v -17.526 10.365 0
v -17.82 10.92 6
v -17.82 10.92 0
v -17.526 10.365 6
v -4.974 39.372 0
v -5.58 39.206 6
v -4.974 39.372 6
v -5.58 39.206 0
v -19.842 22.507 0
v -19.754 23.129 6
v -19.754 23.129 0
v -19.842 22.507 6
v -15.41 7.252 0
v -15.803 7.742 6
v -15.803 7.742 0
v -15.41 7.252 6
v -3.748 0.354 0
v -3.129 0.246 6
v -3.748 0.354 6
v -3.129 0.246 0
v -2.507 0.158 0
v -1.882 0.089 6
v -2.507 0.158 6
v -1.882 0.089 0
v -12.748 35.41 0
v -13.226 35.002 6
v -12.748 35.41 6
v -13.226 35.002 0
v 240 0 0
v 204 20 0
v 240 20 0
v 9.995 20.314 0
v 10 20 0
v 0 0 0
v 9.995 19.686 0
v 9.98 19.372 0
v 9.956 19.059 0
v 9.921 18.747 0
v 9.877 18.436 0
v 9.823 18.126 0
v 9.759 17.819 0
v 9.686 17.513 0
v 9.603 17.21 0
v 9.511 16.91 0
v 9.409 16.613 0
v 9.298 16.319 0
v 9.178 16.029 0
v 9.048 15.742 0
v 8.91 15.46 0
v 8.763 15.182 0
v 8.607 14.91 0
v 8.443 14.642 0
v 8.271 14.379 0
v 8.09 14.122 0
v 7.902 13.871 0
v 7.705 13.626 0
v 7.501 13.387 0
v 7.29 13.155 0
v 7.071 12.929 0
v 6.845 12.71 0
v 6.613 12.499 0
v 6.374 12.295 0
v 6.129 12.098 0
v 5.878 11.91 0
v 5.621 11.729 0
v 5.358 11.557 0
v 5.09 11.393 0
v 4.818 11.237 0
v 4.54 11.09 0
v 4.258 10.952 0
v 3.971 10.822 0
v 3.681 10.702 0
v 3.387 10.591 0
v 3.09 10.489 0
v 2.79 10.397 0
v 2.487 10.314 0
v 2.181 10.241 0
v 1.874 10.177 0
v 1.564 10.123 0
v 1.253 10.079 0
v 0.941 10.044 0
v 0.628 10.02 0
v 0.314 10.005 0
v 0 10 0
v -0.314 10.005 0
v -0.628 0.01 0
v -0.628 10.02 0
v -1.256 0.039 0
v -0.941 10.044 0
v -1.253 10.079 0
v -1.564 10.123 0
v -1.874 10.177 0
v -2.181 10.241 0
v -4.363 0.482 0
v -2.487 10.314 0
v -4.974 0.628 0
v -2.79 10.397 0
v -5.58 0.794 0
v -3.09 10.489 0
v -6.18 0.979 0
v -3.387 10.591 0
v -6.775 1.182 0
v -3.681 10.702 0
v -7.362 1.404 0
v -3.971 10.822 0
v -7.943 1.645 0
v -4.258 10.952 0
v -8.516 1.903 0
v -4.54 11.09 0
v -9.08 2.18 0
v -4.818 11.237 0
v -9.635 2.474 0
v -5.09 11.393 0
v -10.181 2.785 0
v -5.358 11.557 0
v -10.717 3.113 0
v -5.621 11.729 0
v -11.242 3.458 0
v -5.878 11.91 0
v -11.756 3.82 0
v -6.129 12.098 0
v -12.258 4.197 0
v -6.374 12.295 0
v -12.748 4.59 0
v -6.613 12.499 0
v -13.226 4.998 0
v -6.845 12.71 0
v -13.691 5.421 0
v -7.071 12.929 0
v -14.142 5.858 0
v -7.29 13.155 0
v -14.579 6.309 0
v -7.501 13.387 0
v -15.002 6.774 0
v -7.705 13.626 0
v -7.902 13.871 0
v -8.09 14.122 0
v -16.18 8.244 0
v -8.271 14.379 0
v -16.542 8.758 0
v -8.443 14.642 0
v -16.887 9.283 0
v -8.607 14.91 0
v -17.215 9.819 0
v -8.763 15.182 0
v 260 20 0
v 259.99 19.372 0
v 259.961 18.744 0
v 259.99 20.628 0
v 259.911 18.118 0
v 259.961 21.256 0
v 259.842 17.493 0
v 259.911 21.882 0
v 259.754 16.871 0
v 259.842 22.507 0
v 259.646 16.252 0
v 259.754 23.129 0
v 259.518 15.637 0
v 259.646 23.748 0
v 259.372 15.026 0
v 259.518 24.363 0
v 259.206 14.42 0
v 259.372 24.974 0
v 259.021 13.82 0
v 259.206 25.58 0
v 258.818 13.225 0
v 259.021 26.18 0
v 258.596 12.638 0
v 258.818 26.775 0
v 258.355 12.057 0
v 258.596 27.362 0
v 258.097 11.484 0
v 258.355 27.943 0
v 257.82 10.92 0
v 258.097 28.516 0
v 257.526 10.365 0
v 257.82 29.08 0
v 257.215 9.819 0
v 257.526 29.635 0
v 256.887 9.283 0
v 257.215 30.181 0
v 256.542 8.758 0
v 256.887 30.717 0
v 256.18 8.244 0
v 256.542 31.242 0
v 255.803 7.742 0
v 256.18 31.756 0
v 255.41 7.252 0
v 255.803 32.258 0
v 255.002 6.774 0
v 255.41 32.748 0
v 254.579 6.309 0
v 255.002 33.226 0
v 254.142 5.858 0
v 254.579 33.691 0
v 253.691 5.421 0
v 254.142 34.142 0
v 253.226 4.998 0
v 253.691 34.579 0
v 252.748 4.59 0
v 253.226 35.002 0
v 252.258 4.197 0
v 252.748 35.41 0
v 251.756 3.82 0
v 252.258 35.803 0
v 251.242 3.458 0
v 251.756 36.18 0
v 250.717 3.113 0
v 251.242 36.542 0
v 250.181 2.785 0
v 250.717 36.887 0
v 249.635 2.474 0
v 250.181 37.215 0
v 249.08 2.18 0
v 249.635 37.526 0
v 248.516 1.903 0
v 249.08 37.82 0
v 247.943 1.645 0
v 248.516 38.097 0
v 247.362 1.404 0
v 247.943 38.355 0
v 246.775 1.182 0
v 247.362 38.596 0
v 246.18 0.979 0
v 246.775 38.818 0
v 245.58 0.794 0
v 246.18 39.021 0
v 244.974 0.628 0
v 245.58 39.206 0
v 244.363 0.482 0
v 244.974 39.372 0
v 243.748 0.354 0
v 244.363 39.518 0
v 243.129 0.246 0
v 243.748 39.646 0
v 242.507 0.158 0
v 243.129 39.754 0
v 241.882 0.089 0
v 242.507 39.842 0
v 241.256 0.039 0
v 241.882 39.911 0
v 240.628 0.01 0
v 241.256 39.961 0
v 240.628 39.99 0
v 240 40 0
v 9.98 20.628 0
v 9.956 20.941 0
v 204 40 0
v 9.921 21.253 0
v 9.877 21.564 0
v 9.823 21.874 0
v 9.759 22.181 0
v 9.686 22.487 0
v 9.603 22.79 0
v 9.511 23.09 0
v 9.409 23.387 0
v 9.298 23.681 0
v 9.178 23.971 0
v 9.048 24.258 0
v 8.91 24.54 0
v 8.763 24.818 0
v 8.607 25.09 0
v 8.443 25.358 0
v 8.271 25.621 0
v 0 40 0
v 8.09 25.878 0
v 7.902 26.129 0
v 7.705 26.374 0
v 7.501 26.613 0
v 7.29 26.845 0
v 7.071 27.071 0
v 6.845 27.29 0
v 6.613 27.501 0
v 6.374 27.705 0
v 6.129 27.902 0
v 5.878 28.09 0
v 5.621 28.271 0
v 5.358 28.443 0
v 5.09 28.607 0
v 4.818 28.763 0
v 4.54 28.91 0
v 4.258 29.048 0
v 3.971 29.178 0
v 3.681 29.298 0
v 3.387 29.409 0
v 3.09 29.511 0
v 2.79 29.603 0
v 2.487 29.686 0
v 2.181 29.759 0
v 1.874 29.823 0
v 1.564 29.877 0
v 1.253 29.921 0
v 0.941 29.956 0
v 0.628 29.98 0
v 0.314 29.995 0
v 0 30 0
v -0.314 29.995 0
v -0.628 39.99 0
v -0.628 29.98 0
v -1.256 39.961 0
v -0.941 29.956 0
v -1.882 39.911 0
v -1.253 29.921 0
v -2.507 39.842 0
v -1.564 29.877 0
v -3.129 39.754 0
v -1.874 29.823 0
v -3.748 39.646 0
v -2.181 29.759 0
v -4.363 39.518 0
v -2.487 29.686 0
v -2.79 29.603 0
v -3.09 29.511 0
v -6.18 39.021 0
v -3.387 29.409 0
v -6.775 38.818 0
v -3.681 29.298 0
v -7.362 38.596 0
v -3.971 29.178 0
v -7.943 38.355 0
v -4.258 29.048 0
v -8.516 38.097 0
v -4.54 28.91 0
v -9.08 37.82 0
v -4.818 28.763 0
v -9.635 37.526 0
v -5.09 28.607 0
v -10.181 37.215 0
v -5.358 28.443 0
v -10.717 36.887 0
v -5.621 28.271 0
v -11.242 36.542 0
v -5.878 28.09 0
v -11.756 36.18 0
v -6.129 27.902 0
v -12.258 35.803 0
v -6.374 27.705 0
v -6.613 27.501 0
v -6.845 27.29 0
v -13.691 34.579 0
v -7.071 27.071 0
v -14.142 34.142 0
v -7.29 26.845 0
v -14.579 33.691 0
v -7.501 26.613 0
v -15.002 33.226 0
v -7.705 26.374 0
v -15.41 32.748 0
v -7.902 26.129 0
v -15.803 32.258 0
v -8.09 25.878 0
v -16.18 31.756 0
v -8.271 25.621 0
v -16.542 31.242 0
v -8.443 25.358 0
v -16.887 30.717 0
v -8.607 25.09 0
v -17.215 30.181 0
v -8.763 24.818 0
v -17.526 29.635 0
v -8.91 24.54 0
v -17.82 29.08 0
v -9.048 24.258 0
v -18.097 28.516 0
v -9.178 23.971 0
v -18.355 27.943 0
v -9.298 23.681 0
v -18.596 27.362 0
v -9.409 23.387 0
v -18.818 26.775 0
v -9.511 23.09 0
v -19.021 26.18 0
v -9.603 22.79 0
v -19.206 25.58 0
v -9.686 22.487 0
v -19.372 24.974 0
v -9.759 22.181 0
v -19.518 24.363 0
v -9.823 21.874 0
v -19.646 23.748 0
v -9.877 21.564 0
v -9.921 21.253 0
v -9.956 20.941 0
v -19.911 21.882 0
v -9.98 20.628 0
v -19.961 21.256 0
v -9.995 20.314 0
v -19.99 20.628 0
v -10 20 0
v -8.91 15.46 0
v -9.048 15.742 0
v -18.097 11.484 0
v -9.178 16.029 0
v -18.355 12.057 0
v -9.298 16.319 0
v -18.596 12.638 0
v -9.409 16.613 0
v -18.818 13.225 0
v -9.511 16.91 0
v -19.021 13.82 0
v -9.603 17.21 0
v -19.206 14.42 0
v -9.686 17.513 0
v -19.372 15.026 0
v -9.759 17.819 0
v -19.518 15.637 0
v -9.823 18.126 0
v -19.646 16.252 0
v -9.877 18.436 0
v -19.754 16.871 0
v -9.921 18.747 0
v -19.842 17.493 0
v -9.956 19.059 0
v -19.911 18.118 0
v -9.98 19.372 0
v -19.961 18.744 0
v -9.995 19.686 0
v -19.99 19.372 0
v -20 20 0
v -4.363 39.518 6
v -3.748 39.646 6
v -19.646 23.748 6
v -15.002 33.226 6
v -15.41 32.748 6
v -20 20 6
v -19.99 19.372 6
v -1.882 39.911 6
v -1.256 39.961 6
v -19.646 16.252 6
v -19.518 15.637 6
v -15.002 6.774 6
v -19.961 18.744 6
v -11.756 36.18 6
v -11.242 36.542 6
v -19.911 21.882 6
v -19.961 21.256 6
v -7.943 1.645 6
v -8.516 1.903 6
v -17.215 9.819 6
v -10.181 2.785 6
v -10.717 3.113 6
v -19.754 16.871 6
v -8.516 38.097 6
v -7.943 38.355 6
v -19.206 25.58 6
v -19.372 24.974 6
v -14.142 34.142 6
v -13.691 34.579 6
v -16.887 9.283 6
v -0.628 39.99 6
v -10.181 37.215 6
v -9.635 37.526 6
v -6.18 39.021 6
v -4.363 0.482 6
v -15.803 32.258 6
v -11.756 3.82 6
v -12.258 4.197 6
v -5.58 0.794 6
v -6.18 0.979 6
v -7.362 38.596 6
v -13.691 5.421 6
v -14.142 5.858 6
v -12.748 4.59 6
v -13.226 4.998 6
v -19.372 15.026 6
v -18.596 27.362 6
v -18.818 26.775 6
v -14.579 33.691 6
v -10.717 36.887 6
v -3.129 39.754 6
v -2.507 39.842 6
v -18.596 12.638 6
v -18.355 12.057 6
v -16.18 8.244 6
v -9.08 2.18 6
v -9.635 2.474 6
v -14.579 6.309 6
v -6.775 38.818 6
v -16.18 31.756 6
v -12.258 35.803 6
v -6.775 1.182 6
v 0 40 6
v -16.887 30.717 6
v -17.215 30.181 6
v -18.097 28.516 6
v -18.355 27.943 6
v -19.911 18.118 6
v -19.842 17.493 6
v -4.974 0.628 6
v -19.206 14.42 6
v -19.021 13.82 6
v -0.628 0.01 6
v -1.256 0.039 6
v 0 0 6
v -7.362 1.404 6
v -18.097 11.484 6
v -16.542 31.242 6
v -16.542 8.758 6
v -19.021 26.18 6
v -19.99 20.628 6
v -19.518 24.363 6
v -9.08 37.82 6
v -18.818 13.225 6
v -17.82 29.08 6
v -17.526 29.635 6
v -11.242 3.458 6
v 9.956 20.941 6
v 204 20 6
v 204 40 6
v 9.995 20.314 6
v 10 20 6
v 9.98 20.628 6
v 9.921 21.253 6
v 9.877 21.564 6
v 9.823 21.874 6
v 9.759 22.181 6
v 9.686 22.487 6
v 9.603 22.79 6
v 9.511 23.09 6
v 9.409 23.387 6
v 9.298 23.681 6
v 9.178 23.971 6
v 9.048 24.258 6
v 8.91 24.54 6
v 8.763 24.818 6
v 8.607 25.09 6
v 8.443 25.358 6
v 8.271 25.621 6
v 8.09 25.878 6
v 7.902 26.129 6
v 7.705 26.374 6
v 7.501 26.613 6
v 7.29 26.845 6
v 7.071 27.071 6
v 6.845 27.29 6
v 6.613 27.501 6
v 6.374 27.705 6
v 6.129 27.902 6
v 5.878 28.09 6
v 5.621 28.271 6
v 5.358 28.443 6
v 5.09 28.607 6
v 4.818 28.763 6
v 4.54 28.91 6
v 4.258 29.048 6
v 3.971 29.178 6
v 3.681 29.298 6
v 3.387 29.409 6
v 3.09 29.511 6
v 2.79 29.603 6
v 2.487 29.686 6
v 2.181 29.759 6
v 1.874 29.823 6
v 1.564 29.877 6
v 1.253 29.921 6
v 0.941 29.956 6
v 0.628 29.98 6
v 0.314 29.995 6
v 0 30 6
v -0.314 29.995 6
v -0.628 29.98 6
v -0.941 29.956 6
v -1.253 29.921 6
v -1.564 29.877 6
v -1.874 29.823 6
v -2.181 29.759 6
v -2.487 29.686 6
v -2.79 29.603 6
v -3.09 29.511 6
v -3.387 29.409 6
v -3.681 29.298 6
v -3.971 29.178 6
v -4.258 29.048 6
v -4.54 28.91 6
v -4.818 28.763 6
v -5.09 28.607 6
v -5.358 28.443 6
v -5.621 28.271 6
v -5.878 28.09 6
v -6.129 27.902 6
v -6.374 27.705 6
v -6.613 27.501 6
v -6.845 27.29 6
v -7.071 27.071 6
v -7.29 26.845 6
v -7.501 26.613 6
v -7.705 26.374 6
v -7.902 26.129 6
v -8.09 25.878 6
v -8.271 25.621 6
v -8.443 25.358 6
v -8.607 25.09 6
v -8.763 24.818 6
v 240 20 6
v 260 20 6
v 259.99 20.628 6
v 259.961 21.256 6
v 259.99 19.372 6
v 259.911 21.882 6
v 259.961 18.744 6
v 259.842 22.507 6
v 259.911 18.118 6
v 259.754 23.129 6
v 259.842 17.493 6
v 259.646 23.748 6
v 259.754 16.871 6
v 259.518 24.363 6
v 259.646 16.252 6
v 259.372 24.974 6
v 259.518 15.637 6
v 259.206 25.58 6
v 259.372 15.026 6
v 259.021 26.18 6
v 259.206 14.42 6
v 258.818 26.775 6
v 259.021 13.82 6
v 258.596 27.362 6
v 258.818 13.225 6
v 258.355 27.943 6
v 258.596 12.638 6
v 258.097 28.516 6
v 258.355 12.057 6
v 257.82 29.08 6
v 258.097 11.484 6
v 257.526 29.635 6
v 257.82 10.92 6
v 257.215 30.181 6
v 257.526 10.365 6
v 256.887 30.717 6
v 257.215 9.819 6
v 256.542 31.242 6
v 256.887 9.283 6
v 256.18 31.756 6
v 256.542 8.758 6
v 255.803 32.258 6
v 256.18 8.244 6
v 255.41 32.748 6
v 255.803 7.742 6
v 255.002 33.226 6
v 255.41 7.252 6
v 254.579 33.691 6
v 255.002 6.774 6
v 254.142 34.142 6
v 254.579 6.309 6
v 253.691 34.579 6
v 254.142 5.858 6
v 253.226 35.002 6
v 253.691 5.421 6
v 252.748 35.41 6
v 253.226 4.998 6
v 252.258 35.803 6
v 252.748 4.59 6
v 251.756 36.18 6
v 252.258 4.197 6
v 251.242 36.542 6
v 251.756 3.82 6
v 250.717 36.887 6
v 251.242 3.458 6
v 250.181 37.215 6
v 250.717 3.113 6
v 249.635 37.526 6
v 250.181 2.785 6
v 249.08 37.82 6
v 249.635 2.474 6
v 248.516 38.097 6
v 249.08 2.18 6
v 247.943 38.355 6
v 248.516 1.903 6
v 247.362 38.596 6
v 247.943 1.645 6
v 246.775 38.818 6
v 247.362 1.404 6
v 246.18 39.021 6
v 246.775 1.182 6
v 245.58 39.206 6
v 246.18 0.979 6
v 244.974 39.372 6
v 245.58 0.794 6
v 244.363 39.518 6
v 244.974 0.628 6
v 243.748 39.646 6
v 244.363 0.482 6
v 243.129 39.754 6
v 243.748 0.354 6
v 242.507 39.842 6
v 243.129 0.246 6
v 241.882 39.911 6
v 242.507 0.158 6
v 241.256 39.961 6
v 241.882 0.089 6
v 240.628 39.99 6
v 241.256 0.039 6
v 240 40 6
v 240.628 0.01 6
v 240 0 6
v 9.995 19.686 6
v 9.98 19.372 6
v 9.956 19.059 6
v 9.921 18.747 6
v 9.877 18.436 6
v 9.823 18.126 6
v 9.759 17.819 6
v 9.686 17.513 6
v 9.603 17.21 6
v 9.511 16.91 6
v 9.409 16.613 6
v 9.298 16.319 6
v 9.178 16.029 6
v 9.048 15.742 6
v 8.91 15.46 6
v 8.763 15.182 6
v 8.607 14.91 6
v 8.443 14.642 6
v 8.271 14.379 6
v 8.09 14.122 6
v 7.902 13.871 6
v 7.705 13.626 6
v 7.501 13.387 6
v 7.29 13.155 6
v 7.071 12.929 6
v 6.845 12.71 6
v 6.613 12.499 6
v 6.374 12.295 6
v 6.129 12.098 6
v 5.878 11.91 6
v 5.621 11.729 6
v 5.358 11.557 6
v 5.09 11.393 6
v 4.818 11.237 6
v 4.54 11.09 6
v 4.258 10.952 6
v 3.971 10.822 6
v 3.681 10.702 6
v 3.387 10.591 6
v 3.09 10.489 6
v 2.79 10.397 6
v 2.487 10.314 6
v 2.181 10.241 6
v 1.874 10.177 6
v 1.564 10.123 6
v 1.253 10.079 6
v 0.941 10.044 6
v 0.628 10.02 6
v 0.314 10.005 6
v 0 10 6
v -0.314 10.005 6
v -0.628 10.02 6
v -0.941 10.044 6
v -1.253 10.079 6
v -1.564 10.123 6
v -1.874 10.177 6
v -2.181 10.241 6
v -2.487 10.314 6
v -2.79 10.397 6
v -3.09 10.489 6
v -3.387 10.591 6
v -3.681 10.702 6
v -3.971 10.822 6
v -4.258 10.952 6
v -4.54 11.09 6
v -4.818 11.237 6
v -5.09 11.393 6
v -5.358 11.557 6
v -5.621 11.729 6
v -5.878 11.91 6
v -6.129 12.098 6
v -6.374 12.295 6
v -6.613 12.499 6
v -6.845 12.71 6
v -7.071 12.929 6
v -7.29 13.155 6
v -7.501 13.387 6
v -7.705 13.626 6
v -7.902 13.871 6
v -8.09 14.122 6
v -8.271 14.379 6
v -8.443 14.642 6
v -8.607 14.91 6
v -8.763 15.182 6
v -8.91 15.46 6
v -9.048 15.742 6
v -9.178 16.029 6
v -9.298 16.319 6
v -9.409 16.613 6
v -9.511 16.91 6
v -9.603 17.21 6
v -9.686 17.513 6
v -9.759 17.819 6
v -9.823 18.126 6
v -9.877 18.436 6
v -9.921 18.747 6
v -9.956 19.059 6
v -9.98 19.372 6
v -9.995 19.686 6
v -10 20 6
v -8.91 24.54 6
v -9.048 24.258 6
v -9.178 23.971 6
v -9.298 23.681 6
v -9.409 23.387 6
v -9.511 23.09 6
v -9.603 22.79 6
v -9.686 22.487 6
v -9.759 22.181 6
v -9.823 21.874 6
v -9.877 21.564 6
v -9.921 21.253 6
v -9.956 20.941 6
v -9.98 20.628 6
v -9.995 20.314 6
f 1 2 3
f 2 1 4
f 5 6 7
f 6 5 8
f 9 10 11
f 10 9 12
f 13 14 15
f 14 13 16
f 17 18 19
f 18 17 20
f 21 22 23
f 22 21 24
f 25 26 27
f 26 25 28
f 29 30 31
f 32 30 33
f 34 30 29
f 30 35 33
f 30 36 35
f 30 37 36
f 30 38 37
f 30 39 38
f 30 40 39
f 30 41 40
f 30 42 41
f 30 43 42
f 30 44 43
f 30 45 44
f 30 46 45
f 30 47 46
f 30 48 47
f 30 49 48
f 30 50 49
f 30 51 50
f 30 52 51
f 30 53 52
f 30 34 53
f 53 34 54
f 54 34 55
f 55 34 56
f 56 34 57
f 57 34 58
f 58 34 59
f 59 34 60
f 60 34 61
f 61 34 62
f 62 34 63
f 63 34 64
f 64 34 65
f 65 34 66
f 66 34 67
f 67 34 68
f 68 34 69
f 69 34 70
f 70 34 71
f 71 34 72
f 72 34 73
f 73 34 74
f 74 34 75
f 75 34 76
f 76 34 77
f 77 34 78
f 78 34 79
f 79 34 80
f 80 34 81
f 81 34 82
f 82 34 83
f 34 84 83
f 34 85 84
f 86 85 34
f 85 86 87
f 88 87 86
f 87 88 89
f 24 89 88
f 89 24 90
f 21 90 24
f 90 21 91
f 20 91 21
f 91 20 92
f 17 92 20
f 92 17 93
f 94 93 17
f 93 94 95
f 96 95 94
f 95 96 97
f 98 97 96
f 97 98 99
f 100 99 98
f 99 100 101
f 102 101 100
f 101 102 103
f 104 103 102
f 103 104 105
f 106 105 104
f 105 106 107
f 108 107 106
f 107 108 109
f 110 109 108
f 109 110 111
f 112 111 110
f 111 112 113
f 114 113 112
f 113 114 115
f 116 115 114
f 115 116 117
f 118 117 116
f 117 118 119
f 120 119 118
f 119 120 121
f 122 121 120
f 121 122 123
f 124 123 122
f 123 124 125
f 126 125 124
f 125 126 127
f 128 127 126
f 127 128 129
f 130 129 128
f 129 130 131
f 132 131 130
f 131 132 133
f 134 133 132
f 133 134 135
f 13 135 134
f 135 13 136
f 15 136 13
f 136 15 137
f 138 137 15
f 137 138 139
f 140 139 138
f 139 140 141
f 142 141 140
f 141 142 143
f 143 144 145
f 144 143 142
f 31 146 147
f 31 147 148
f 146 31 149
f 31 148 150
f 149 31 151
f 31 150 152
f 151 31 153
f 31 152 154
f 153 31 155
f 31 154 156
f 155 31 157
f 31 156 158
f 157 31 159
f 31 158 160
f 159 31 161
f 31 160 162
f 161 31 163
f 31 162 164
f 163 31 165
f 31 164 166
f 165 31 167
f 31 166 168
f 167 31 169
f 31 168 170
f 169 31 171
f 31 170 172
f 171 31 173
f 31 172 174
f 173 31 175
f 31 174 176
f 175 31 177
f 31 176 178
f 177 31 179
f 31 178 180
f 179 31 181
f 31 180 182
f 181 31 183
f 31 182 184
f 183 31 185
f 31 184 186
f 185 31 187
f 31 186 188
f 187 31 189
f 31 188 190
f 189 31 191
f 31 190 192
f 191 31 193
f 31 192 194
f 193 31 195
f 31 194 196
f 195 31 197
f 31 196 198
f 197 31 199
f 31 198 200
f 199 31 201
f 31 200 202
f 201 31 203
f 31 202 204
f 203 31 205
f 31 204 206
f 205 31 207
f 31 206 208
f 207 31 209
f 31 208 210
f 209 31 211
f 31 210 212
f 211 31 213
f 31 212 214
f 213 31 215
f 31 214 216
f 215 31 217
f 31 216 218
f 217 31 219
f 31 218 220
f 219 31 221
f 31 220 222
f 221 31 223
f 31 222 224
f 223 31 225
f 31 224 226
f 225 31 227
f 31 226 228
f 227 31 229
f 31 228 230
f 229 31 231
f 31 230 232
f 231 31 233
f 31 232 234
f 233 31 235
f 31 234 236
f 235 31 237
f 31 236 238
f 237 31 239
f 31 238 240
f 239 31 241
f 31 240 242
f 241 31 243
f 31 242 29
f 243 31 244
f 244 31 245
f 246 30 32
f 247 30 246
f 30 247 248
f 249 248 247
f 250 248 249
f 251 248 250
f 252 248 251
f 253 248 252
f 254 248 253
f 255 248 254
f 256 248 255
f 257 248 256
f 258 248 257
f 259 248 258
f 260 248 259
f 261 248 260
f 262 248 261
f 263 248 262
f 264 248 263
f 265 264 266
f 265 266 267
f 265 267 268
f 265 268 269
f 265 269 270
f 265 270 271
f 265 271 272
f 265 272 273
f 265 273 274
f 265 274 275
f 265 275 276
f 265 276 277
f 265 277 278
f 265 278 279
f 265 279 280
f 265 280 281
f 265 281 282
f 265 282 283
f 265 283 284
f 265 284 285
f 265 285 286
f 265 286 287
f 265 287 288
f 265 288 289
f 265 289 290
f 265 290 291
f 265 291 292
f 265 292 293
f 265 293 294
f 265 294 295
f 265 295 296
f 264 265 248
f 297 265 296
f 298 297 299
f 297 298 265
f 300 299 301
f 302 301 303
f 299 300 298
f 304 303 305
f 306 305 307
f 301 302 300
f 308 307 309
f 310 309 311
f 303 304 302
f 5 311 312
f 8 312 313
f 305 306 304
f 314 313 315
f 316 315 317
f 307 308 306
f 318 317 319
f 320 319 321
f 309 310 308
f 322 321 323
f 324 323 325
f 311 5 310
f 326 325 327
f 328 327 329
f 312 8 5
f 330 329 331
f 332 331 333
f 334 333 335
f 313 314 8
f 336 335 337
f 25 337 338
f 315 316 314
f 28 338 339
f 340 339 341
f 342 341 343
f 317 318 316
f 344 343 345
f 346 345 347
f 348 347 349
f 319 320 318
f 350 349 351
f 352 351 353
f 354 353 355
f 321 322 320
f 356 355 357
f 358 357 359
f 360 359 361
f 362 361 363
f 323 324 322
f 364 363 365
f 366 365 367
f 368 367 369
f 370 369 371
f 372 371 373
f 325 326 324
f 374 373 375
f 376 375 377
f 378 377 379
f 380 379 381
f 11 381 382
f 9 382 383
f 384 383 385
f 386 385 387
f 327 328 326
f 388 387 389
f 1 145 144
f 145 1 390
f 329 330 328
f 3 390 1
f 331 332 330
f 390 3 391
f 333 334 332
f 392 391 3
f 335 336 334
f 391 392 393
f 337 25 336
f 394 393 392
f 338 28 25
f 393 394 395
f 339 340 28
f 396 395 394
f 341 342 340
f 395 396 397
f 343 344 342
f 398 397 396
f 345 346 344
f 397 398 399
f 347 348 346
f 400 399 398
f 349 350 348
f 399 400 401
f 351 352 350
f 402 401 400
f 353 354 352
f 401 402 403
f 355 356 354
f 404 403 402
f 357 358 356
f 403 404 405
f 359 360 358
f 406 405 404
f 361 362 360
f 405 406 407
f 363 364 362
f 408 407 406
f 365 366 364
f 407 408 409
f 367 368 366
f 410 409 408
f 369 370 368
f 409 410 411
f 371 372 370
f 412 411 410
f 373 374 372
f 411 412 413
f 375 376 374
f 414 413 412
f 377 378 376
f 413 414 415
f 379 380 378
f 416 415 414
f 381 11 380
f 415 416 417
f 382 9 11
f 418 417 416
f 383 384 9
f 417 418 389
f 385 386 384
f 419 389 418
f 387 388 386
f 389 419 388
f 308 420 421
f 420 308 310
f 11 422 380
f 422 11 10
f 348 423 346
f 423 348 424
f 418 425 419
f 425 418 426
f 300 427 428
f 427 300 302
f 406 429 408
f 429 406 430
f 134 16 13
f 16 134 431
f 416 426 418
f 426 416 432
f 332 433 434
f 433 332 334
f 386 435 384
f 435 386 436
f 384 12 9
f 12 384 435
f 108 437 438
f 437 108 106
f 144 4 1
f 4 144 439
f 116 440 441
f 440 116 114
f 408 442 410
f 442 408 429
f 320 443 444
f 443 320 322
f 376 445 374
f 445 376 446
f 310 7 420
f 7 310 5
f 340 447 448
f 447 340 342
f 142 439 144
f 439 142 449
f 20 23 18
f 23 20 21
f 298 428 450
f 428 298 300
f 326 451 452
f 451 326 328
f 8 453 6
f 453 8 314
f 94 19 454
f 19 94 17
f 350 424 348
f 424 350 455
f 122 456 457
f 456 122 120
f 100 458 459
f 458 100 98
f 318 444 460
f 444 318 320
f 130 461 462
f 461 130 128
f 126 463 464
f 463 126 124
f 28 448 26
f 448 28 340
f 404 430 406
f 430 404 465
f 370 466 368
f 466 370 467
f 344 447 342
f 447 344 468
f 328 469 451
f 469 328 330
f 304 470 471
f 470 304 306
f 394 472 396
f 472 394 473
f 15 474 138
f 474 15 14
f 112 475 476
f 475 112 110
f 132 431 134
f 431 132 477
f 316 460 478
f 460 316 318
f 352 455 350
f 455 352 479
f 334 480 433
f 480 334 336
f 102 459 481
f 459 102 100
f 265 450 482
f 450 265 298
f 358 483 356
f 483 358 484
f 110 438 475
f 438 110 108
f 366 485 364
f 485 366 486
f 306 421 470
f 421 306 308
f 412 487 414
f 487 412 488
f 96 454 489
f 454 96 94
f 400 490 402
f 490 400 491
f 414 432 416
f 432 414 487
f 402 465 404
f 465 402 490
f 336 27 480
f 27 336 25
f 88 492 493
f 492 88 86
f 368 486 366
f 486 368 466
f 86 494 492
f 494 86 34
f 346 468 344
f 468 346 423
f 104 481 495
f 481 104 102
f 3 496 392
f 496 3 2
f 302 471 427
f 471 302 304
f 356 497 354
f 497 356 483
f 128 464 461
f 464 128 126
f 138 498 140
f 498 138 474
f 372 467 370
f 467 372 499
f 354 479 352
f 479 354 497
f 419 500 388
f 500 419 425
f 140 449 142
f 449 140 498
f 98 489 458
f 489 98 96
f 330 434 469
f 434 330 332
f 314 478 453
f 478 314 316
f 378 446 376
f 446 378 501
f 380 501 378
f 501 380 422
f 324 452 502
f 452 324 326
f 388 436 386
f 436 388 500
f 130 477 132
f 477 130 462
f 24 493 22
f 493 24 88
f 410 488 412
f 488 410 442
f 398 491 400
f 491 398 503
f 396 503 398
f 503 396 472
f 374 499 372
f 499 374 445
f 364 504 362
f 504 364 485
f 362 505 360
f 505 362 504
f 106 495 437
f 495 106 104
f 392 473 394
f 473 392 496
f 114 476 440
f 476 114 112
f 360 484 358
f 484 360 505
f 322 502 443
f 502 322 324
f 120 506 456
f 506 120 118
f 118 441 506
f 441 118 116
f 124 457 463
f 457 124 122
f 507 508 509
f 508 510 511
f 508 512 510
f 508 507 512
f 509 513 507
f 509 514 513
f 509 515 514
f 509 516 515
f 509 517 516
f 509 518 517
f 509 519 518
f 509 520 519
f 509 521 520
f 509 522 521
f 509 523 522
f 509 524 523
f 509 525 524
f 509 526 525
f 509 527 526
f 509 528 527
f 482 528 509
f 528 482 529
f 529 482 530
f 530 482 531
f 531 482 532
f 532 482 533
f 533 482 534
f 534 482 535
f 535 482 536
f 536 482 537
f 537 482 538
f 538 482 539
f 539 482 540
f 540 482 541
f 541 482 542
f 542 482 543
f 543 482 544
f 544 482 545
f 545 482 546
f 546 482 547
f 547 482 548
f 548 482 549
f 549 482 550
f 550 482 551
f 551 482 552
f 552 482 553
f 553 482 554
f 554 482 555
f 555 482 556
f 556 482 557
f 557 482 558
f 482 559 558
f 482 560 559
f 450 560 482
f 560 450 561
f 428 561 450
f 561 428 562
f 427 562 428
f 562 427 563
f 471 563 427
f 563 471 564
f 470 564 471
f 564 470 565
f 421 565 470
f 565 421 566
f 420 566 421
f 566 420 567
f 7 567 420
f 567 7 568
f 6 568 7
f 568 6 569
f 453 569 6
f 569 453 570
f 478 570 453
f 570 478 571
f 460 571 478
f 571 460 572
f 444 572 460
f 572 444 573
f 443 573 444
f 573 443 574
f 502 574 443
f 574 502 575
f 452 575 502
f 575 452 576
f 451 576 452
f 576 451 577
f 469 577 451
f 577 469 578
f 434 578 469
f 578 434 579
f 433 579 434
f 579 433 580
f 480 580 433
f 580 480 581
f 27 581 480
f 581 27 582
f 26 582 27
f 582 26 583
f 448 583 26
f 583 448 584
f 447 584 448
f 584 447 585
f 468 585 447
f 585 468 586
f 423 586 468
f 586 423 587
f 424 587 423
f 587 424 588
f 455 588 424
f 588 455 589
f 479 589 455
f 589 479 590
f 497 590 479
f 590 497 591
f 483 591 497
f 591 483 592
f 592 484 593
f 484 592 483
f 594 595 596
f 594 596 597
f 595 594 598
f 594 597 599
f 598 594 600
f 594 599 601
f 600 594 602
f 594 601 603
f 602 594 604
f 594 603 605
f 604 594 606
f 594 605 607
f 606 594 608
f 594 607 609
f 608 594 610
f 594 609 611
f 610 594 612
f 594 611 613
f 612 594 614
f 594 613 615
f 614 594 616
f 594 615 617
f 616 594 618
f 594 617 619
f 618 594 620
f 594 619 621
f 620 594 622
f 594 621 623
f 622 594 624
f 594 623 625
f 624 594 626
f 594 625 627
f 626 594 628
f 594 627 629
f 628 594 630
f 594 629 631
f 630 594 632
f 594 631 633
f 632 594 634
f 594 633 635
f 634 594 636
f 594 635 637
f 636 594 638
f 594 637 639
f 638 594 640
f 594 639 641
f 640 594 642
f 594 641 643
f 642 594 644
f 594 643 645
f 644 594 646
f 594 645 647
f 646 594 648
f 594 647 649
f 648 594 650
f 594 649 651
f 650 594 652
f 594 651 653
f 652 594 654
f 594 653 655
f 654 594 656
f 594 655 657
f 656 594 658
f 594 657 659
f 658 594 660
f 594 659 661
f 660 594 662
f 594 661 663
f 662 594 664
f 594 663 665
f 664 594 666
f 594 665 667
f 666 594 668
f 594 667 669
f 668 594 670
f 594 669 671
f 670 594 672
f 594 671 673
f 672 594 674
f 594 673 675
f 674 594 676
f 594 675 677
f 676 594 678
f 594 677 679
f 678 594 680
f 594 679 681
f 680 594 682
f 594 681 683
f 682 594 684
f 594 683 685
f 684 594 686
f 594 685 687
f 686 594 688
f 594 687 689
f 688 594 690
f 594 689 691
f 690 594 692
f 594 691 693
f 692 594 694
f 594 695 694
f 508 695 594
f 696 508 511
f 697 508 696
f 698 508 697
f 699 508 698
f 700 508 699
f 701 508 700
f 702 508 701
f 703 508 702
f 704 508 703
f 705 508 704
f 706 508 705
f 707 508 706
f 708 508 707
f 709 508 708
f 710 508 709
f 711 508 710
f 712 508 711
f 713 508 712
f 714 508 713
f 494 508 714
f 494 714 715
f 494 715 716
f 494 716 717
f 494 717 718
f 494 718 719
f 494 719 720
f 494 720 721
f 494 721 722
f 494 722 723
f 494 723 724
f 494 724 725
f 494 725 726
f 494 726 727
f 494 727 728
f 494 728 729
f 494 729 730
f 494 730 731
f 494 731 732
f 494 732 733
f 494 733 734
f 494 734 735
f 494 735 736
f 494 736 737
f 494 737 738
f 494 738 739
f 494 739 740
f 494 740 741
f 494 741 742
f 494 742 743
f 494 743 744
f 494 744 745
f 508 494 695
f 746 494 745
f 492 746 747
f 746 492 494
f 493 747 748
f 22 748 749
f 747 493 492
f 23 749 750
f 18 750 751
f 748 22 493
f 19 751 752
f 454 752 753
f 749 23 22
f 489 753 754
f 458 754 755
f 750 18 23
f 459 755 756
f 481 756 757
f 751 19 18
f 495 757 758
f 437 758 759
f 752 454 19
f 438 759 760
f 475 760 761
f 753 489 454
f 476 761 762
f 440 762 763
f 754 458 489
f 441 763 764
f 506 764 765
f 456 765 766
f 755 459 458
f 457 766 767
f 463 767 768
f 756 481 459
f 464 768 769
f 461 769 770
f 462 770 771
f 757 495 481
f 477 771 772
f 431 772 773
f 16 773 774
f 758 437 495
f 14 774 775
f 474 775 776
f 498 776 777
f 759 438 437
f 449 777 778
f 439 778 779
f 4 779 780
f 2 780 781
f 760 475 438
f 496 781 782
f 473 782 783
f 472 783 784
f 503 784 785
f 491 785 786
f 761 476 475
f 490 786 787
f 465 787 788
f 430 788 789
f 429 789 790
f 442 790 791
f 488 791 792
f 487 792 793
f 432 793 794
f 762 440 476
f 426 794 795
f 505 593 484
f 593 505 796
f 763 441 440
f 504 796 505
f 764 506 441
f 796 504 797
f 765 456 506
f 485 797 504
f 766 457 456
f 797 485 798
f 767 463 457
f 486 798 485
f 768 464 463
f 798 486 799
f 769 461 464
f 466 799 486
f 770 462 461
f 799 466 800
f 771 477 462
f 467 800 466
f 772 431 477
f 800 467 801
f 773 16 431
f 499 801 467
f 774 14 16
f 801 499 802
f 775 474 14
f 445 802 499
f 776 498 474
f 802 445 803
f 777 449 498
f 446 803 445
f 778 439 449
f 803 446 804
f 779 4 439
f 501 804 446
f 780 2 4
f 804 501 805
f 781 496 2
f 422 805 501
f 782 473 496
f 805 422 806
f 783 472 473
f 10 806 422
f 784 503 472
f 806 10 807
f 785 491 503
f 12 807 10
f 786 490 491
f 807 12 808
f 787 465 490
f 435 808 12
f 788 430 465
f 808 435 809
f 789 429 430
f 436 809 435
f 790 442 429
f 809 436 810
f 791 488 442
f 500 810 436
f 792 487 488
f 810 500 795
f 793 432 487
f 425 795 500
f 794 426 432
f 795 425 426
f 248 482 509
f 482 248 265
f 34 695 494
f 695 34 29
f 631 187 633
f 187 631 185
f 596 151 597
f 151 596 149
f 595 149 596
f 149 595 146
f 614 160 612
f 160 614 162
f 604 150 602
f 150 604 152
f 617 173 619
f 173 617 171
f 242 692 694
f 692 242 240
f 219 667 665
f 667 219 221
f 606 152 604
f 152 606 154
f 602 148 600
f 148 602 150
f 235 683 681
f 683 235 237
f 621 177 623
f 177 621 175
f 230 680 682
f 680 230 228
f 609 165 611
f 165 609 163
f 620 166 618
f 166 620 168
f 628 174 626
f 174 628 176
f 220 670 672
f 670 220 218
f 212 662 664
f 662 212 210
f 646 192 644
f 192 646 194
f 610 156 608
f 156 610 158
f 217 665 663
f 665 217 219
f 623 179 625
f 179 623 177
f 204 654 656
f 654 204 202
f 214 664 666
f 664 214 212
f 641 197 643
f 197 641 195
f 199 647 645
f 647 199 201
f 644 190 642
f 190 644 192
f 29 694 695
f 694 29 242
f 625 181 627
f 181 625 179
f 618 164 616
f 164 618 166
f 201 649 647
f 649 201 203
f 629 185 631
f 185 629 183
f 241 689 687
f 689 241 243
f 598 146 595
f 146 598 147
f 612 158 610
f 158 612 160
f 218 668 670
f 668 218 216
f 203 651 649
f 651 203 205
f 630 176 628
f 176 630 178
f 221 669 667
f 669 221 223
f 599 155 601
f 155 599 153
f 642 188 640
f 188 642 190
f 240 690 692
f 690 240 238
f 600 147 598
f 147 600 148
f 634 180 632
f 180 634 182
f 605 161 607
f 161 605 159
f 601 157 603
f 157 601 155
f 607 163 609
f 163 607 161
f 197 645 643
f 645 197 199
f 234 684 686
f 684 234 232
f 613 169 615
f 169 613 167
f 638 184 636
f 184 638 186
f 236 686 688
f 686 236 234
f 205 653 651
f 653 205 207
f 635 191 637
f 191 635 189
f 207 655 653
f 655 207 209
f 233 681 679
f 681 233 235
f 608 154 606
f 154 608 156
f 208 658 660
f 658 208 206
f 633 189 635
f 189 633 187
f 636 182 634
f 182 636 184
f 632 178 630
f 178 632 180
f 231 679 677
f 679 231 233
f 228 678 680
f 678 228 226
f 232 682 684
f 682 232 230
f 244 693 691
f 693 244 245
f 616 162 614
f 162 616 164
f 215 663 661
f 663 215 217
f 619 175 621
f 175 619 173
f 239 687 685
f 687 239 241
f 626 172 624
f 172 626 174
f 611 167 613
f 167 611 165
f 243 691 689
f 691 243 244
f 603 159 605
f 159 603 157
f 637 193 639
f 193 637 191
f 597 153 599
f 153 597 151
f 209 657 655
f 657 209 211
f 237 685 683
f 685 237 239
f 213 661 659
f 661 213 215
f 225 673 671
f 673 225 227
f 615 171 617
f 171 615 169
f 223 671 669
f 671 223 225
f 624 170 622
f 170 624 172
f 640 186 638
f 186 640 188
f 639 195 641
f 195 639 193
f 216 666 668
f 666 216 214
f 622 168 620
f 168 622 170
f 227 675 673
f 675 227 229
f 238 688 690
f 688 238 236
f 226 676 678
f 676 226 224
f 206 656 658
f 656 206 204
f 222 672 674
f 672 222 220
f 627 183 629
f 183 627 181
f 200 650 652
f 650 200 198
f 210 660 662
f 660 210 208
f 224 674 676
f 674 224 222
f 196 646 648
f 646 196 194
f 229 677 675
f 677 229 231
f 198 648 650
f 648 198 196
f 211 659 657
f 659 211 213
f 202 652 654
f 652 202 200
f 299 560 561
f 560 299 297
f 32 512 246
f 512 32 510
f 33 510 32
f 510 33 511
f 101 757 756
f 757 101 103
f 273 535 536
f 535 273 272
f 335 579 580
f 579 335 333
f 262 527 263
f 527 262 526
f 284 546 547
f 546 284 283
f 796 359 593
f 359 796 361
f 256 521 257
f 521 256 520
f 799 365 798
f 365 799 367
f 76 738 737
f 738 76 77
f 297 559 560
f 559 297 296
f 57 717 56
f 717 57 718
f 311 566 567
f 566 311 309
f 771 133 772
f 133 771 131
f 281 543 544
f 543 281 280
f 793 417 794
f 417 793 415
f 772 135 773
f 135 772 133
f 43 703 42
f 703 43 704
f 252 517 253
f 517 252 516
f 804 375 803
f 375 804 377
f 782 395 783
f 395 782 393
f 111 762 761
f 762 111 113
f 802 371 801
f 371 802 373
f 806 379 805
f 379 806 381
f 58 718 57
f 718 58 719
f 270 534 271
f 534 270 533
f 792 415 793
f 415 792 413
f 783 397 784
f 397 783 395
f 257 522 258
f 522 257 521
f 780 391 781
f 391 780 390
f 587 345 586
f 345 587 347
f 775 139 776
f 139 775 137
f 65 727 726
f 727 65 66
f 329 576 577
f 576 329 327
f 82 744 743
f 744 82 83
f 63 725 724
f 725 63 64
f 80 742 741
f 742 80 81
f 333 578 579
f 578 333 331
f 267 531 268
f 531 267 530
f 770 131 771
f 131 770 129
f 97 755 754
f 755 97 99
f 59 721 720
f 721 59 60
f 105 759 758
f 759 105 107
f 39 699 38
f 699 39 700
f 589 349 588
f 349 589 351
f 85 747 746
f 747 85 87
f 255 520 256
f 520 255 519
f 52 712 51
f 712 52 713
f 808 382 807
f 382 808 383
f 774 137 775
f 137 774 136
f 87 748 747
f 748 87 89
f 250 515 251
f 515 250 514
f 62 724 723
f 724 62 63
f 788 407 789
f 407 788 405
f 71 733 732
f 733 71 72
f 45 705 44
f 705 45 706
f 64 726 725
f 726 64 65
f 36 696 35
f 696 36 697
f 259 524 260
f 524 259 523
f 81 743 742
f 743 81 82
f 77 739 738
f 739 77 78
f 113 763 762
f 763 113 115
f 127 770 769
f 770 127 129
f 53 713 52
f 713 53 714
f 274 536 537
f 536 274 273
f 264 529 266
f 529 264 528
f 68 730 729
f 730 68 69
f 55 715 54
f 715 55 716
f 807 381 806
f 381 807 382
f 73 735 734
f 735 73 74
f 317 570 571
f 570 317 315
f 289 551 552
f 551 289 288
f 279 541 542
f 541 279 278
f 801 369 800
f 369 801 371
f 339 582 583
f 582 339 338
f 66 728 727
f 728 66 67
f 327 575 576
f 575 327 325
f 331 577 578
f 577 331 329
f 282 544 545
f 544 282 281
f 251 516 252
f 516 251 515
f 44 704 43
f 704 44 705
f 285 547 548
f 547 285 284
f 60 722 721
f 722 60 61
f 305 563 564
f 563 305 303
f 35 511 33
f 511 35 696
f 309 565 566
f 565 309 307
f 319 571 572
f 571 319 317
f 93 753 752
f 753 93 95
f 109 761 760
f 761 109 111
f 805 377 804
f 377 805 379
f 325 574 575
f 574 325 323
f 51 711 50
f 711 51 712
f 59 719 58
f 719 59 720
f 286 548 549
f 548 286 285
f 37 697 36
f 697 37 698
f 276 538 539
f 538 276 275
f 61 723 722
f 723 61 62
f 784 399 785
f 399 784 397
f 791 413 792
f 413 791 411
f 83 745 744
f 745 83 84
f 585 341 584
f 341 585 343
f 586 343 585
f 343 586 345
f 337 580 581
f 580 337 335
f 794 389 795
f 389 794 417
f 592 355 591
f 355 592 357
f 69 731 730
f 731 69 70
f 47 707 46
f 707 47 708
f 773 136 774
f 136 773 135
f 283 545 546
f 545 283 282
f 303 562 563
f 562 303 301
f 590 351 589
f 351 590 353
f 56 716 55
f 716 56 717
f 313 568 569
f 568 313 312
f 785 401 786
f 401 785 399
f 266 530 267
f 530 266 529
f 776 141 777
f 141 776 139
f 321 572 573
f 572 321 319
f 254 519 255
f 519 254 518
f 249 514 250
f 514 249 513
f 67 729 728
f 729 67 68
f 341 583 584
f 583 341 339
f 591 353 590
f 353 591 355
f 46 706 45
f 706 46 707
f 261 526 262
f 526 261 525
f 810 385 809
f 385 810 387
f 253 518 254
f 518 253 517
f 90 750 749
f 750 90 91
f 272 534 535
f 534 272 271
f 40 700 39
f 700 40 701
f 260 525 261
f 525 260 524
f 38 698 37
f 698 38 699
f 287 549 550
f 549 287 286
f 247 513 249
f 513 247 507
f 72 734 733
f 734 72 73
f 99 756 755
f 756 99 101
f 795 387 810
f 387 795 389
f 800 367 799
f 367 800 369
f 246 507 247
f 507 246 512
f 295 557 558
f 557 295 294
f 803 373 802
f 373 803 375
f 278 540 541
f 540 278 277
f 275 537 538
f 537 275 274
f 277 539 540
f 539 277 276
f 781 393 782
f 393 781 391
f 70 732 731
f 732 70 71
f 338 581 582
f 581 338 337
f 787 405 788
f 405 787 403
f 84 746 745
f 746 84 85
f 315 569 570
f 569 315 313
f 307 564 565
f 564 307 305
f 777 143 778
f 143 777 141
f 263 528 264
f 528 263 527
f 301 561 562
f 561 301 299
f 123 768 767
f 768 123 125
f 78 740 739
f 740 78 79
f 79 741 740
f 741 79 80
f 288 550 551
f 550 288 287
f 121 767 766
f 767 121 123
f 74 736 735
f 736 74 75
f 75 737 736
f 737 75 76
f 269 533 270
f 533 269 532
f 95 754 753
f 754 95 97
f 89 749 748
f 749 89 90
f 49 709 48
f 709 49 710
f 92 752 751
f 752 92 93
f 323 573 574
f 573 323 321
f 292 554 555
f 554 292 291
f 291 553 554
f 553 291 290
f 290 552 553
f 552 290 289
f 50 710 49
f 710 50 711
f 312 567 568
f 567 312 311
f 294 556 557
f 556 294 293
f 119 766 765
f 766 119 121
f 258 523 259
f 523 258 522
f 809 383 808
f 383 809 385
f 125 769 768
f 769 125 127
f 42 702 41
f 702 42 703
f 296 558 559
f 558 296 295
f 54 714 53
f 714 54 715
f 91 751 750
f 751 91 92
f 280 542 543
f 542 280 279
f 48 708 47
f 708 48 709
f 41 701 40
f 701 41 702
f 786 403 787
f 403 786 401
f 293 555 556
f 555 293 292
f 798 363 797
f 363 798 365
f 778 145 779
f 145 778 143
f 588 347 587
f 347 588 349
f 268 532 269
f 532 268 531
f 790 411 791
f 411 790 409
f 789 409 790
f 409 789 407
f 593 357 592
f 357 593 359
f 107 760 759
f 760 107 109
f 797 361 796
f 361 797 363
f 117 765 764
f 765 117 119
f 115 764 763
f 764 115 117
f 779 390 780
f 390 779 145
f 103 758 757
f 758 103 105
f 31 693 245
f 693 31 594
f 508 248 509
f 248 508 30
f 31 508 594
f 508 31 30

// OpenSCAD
$fn = 200;

size_x = 240;
size_y = 40;
size_z = 6;
hole = size_y / 4;
door_width = 36;

difference(){
    union() {
        translate([0, size_y / 2, 0]) cylinder(r1 = size_y/2, r2 = size_y / 2, h = size_z);
        translate([0, 0, 0]) cube([size_x, size_y, size_z]);
        translate([size_x, size_y / 2, 0]) cylinder(r1 = size_y/2, r2 = size_y / 2, h = size_z);
    }
    union() {
        translate([0, size_y / 2, 0]) cylinder(r1 = hole, r2 = hole, h = size_z + 1);
        translate([size_x - door_width, size_y / 2, 0]) cube([door_width, size_y, size_z + 1]);
    }
}
    


/*CubePoints = [*/
  /*[  0,  0,  0 ],  //0*/
  /*[ 10,  0,  0 ],  //1*/
  /*[ 10,  7,  0 ],  //2*/
  /*[  0,  0,  5 ],  //3*/
  /*[ 10,  0,  5 ],  //4*/
  /*[ 10,  7,  5 ];  //5*/
/*}*/
  
/*CubeFaces = [*/
  /*[0,1,2],  // bottom*/
  /*[3,4,1,0],  // front*/
  /*[5,4,3],  // top*/
  /*[4,5,2,1],  // right*/
  /*[5,2],  // back*/
  /*[3,0]]; // left*/
  
/*polyhedron( CubePoints, CubeFaces );*/






*cube([10, 10, 10]);
*%sphere(10);

*cylinder(r1 = 5, r2 = 5, h = 20);

*translate([10, 0, 0]) cube([10, 10, 10]);


*rotate(a = 90, v=[1, 0, 0]) cylinder(r1 = 5, r2 = 5, h = 10);


*for(i = [10:10:100]) {
    translate([20, i, 0]) cylinder(r1 = 5, r2 = 1, h = 20);
}
